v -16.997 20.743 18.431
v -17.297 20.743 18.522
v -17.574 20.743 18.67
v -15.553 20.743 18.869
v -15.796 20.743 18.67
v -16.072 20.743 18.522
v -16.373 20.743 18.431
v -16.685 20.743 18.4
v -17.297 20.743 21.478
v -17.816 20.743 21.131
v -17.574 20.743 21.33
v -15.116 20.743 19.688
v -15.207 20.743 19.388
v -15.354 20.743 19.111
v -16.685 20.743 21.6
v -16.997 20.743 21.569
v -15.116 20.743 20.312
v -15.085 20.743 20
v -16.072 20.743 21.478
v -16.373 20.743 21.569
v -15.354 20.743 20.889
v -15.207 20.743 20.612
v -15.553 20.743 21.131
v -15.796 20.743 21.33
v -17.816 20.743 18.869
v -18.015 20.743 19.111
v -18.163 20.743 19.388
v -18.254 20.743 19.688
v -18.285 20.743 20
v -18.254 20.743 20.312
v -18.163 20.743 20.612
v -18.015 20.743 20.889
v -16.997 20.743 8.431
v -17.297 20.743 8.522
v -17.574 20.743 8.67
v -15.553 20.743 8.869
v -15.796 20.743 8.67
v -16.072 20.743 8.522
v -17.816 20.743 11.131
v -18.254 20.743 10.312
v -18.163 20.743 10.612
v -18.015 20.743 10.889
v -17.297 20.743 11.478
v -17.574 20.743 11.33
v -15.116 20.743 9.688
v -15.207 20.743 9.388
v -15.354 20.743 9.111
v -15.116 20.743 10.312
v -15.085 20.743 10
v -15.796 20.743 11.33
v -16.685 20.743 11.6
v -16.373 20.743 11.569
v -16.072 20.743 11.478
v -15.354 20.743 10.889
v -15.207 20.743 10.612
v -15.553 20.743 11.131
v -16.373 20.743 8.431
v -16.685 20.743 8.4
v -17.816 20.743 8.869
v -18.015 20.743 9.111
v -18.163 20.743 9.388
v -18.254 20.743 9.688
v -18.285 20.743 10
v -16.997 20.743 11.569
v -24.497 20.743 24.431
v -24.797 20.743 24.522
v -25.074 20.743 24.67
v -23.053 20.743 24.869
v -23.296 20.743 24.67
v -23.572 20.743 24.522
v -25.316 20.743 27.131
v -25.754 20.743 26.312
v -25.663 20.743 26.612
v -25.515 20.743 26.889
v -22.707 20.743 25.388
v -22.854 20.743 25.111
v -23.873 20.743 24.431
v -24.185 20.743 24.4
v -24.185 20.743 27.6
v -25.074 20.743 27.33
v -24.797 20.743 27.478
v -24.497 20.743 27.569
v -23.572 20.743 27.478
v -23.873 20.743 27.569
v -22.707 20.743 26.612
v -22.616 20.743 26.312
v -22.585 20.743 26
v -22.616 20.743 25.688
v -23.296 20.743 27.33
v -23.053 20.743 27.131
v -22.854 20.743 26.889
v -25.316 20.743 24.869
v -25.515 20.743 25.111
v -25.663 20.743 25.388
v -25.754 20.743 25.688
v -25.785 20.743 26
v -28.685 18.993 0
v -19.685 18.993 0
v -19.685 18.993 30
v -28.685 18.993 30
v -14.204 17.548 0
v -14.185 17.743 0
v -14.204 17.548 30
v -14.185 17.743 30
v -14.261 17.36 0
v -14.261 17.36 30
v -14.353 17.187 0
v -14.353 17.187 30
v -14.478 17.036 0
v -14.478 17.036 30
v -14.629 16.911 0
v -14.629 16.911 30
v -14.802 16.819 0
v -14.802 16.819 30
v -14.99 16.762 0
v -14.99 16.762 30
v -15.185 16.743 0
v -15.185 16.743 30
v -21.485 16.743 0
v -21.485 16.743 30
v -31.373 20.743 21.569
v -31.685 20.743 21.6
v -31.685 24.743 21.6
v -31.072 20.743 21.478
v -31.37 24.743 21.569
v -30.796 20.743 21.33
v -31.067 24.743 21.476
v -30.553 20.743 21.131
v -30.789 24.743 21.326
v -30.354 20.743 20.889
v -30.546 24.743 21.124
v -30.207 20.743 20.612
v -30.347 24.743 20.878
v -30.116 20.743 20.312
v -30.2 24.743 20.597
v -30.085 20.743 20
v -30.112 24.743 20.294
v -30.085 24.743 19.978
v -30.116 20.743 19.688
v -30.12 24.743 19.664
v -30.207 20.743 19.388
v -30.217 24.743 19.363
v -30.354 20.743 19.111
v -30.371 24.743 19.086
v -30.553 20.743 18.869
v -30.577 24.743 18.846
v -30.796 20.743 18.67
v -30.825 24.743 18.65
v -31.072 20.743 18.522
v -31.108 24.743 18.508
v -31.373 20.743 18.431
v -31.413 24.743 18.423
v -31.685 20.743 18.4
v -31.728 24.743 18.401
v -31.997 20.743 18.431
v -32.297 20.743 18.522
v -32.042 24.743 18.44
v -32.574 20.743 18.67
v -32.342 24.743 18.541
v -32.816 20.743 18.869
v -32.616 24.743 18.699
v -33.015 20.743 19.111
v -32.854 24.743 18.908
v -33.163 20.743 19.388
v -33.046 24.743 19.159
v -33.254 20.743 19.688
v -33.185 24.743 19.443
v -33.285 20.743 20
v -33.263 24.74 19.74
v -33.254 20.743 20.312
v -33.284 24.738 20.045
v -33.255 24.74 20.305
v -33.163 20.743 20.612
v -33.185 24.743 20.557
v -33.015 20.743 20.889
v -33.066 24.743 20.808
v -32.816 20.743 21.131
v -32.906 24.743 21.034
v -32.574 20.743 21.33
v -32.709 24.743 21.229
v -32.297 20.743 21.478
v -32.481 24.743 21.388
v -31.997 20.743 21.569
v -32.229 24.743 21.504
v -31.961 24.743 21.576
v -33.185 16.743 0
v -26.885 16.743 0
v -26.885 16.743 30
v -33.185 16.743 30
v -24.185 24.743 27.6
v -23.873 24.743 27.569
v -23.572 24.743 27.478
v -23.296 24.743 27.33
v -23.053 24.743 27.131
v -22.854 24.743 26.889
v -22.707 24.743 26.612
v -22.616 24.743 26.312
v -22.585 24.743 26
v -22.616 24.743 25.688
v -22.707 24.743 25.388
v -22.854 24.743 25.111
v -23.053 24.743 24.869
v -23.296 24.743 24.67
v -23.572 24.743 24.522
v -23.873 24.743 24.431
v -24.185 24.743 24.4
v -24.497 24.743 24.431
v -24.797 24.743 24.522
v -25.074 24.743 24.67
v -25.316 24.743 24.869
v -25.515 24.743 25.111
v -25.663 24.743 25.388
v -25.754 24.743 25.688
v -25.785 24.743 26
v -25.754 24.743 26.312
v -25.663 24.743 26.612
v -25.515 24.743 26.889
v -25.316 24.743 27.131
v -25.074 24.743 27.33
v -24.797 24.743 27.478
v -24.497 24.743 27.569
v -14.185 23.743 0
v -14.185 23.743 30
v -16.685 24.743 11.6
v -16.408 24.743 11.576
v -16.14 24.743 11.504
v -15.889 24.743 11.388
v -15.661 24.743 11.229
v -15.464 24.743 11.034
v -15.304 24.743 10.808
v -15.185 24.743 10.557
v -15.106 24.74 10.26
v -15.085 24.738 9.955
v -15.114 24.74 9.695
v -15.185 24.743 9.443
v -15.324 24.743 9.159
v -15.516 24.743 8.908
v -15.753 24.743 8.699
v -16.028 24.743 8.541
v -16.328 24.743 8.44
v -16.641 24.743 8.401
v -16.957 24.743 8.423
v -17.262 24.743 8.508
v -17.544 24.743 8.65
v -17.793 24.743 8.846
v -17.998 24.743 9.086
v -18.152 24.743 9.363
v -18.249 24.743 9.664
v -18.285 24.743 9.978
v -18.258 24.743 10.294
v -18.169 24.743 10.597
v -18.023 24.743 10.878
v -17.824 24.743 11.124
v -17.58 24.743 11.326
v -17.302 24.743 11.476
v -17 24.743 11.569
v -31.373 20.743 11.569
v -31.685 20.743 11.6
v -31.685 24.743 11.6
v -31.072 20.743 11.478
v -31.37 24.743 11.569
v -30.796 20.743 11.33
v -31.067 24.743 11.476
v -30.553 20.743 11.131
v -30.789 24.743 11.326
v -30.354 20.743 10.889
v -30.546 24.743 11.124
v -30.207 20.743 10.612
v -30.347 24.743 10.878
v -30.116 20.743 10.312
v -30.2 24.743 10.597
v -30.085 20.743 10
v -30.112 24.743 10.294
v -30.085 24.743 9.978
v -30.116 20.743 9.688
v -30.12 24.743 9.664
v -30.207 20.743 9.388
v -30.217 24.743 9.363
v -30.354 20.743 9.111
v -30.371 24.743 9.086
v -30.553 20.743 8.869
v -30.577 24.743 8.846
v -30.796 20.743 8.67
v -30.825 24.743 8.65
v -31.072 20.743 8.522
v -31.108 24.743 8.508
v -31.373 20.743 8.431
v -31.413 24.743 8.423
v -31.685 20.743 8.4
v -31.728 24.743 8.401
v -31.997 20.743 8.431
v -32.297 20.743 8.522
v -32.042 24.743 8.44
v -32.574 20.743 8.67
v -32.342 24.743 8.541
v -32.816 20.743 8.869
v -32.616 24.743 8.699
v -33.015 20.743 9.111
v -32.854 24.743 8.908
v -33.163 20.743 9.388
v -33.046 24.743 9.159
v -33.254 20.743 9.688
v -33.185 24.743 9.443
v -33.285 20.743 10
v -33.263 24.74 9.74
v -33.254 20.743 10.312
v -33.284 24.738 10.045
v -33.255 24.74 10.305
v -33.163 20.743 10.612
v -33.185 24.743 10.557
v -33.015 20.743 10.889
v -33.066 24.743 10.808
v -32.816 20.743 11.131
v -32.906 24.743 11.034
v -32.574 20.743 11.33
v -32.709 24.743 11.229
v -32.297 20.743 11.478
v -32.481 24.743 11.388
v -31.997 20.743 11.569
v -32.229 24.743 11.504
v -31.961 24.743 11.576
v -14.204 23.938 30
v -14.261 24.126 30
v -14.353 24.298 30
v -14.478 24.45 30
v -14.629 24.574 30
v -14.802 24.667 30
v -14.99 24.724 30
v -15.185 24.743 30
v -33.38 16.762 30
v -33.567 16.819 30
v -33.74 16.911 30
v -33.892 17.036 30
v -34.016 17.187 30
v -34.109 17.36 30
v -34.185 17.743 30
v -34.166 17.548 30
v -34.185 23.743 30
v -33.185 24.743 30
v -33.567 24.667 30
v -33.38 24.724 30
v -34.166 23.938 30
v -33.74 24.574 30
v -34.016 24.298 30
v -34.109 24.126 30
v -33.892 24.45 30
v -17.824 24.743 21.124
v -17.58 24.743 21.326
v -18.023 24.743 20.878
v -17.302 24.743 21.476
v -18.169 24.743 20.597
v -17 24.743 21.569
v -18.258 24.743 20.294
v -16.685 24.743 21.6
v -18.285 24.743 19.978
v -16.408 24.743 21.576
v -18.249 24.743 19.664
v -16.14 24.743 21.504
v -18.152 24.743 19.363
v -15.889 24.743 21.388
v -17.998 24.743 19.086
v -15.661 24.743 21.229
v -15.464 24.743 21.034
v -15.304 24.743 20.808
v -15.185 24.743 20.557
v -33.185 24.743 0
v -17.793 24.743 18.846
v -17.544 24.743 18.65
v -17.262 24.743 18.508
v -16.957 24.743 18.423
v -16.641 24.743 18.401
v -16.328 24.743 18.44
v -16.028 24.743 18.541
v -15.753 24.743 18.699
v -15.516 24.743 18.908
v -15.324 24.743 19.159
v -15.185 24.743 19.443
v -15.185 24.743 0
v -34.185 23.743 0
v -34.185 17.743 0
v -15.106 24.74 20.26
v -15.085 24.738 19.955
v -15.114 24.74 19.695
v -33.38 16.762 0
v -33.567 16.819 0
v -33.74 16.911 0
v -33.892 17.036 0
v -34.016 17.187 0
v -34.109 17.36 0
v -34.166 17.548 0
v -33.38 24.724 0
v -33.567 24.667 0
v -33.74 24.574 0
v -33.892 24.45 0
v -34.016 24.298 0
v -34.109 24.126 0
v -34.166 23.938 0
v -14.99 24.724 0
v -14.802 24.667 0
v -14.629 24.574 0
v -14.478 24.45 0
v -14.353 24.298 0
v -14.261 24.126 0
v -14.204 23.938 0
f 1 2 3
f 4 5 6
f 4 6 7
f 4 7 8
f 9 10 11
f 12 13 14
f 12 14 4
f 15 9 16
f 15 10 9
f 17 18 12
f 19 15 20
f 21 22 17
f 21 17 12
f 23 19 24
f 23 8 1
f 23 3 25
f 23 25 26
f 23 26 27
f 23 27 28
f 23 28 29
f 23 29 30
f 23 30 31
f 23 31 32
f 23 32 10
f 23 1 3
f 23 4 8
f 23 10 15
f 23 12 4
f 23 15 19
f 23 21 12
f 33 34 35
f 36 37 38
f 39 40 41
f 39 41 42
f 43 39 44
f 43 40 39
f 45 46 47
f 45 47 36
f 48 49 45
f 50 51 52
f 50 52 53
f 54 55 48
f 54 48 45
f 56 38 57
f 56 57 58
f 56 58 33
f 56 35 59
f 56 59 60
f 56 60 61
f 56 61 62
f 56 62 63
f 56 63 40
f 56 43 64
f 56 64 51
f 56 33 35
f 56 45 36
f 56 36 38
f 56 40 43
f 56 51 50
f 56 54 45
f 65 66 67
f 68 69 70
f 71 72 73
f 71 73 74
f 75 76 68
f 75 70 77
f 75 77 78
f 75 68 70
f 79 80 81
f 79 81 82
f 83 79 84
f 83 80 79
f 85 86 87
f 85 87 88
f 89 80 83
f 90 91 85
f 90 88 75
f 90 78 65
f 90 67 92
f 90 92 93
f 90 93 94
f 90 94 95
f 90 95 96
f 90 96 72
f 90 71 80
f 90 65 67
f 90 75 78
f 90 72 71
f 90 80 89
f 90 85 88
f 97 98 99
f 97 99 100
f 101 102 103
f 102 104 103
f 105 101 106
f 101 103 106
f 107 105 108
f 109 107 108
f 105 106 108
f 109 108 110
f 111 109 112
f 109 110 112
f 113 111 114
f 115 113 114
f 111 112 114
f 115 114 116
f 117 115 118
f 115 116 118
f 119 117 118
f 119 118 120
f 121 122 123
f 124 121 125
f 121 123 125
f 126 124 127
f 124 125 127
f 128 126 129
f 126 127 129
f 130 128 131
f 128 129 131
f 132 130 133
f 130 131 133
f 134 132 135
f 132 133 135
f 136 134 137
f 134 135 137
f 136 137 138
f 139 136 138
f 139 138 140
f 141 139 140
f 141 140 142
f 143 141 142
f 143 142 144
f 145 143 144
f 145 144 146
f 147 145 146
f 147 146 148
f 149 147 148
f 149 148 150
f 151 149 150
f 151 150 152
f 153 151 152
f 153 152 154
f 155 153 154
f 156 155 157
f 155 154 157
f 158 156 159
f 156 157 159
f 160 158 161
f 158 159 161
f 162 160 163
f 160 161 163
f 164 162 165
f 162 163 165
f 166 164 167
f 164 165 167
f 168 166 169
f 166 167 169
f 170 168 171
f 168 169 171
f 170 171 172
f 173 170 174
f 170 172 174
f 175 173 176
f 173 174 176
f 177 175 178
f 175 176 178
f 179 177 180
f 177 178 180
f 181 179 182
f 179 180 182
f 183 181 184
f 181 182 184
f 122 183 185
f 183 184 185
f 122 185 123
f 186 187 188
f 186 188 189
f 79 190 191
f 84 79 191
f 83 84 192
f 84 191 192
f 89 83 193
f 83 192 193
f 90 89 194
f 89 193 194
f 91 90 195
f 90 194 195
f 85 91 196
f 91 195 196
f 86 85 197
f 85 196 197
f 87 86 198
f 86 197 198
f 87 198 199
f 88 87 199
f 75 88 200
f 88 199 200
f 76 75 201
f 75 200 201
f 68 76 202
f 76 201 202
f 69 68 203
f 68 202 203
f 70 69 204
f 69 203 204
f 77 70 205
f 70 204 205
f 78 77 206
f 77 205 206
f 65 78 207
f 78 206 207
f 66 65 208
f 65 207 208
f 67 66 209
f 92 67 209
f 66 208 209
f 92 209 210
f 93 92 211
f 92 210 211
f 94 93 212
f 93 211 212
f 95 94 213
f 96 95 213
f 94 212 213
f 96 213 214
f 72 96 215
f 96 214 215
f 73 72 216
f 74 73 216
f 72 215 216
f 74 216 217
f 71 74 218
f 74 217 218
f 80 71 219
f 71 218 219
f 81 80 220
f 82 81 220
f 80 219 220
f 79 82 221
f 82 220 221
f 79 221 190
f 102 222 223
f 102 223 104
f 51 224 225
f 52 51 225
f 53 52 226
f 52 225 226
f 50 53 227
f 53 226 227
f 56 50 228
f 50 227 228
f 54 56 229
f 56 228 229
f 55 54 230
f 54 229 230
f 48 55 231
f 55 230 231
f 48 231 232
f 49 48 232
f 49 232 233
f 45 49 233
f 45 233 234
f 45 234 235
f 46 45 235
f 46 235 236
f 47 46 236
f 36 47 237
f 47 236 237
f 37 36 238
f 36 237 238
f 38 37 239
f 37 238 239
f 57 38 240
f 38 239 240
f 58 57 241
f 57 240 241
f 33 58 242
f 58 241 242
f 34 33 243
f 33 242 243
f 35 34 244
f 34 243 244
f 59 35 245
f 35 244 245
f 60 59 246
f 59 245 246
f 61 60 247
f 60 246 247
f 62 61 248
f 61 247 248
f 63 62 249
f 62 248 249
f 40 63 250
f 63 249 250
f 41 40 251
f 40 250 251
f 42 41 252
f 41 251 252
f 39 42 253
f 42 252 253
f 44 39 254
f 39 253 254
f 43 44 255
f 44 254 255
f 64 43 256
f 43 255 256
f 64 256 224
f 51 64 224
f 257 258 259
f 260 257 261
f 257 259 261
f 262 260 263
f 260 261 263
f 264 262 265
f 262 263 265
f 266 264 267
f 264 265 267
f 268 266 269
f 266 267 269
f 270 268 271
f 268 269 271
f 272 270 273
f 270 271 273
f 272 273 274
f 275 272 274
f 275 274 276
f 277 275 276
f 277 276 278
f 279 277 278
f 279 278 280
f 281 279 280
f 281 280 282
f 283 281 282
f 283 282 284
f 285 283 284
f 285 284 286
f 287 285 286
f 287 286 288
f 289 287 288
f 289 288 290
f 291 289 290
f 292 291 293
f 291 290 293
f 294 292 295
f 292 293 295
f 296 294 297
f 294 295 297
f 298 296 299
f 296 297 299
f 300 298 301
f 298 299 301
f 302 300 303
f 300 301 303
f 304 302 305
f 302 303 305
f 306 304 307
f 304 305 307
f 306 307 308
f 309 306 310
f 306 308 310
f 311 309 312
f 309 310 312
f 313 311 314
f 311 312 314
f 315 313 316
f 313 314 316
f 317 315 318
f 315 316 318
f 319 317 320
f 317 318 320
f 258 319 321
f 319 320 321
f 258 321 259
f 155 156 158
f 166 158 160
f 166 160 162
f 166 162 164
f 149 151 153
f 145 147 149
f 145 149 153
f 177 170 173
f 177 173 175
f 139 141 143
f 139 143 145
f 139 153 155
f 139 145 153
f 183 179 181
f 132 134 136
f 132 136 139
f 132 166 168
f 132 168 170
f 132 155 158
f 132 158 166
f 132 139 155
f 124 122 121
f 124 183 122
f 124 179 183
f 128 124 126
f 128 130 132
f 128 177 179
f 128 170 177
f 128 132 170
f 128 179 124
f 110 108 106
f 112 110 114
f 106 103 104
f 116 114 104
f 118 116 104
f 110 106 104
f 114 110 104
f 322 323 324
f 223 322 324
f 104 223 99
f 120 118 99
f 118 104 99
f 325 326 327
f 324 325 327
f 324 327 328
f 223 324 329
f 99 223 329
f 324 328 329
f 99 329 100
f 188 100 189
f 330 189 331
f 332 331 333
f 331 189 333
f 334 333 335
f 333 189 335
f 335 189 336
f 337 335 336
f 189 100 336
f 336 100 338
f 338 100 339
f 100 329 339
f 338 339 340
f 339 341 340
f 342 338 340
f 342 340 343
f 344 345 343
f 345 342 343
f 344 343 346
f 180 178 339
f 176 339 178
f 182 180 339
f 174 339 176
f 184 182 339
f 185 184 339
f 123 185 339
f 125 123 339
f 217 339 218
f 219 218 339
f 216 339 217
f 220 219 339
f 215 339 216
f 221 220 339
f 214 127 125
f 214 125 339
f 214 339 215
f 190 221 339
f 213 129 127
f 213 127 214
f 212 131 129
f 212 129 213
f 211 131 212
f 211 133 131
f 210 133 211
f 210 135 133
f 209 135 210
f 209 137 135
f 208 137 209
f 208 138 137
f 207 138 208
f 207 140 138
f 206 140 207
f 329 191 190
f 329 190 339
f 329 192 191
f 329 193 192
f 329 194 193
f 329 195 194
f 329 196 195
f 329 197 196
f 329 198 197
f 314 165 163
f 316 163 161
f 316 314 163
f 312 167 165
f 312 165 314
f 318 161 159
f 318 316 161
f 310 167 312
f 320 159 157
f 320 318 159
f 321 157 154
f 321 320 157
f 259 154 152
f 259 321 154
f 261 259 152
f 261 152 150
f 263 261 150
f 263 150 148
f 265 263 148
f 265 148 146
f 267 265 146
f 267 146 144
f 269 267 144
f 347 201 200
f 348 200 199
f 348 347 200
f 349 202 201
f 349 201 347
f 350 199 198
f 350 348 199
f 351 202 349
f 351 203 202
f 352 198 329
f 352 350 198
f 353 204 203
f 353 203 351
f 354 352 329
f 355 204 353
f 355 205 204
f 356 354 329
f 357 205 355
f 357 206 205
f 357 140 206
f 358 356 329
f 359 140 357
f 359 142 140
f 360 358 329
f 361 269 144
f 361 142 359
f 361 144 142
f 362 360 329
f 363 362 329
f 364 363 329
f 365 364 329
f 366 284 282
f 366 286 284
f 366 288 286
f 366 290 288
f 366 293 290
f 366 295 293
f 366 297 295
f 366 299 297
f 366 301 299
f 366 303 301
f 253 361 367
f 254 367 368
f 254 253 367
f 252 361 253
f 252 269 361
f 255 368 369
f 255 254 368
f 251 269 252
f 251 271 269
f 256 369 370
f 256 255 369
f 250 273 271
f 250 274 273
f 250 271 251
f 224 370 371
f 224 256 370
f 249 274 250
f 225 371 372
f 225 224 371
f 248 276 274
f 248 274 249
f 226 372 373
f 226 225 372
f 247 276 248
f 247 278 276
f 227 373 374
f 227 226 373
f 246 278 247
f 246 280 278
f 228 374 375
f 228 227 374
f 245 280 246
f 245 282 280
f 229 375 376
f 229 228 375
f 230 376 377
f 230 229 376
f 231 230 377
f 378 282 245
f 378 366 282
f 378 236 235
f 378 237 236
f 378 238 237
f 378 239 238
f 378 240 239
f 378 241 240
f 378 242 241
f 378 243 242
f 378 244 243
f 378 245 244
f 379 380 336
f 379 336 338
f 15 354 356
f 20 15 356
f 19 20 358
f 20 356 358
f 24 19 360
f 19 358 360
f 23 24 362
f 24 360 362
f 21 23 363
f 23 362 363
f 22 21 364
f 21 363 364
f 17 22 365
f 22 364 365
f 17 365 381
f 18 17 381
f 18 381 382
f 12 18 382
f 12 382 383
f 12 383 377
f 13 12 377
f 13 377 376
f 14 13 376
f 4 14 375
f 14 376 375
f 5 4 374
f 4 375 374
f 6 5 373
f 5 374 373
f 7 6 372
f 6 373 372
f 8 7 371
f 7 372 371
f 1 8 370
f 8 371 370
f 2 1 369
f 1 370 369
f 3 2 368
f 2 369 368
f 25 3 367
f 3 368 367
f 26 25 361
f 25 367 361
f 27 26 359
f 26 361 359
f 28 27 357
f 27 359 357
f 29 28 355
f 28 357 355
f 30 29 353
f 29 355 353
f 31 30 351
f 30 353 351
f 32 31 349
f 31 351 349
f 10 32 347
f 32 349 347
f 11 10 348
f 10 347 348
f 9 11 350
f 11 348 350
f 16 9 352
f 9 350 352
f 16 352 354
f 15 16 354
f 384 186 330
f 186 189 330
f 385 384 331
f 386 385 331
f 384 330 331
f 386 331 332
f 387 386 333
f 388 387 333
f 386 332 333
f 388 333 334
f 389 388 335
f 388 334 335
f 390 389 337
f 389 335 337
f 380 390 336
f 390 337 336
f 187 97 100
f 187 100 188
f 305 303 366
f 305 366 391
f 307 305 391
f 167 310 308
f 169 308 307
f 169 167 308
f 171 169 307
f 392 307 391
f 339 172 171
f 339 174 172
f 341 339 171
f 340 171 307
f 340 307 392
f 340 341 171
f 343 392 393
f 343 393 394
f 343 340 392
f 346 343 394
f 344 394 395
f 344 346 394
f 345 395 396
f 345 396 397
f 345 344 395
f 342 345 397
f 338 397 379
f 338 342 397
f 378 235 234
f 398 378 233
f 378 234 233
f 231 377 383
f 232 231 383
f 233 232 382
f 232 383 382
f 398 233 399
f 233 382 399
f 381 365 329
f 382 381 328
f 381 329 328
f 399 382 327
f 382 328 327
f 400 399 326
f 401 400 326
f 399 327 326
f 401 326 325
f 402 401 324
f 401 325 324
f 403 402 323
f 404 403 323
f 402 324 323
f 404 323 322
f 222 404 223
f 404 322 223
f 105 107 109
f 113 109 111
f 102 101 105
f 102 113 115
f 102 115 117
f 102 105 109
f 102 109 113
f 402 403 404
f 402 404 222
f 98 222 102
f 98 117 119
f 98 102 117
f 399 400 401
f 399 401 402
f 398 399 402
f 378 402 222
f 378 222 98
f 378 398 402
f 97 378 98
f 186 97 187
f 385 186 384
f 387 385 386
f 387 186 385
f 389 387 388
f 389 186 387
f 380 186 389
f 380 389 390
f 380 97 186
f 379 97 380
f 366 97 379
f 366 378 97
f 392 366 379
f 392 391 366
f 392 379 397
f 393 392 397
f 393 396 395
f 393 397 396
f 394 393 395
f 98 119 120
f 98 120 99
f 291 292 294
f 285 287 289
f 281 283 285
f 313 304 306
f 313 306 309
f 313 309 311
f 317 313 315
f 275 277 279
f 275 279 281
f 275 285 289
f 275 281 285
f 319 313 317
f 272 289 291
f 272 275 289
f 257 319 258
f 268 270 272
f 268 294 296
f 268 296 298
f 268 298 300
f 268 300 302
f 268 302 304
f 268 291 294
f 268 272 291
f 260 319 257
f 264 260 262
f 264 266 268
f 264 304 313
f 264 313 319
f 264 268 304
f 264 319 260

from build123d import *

# Parameters (mm, degrees)
EXTRUDE_1_DEPTH     = 30
FILLET_1_R          = 1
SKETCH_3_R          = 1.6
CUT_EXTRUDE_1_DEPTH = 4


with BuildPart() as part:
    # 草图1 → 凸台-拉伸1 (new body)
    with BuildSketch(Plane.XY):
        Polygon((-34.18476969, 24.74285776), (-14.18476969, 24.74285776), (-14.18476969, 16.74285776), (-21.48476969, 16.74285776), (-19.68476969, 18.99285776), (-28.68476969, 18.99285776), (-26.88476969, 16.74285776), (-34.18476969, 16.74285776), align=None)
    extrude(amount=EXTRUDE_1_DEPTH)

    # 圆角1
    fillet_1_edges = [part.edges().sort_by_distance(p)[0] for p in [
        (-34.18476969, 24.74285776, 15),
        (-14.18476969, 24.74285776, 15),
        (-14.18476969, 16.74285776, 15),
        (-34.18476969, 16.74285776, 15),
    ]]
    fillet(fillet_1_edges, radius=FILLET_1_R)

    # 草图3 → 切除-拉伸1 (cut)
    with BuildSketch(Plane(origin=(0, 24.74285776, 0), x_dir=(1, 0, 0), z_dir=(0, 1, 0))):
        with Locations(Location((-31.68476969, -10, 0), (0, 0, 270))):
            Circle(SKETCH_3_R)
        with Locations(Location((-31.68476969, -20, 0), (0, 0, 270))):
            Circle(SKETCH_3_R)
        with Locations(Location((-16.68476969, -10, 0), (0, 0, 270))):
            Circle(SKETCH_3_R)
        with Locations(Location((-16.68476969, -20, 0), (0, 0, 270))):
            Circle(SKETCH_3_R)
        with Locations(Location((-24.18476969, -26, 0), (0, 0, 270))):
            Circle(SKETCH_3_R)
    extrude(amount=-CUT_EXTRUDE_1_DEPTH, mode=Mode.SUBTRACT)


solid = part.part
